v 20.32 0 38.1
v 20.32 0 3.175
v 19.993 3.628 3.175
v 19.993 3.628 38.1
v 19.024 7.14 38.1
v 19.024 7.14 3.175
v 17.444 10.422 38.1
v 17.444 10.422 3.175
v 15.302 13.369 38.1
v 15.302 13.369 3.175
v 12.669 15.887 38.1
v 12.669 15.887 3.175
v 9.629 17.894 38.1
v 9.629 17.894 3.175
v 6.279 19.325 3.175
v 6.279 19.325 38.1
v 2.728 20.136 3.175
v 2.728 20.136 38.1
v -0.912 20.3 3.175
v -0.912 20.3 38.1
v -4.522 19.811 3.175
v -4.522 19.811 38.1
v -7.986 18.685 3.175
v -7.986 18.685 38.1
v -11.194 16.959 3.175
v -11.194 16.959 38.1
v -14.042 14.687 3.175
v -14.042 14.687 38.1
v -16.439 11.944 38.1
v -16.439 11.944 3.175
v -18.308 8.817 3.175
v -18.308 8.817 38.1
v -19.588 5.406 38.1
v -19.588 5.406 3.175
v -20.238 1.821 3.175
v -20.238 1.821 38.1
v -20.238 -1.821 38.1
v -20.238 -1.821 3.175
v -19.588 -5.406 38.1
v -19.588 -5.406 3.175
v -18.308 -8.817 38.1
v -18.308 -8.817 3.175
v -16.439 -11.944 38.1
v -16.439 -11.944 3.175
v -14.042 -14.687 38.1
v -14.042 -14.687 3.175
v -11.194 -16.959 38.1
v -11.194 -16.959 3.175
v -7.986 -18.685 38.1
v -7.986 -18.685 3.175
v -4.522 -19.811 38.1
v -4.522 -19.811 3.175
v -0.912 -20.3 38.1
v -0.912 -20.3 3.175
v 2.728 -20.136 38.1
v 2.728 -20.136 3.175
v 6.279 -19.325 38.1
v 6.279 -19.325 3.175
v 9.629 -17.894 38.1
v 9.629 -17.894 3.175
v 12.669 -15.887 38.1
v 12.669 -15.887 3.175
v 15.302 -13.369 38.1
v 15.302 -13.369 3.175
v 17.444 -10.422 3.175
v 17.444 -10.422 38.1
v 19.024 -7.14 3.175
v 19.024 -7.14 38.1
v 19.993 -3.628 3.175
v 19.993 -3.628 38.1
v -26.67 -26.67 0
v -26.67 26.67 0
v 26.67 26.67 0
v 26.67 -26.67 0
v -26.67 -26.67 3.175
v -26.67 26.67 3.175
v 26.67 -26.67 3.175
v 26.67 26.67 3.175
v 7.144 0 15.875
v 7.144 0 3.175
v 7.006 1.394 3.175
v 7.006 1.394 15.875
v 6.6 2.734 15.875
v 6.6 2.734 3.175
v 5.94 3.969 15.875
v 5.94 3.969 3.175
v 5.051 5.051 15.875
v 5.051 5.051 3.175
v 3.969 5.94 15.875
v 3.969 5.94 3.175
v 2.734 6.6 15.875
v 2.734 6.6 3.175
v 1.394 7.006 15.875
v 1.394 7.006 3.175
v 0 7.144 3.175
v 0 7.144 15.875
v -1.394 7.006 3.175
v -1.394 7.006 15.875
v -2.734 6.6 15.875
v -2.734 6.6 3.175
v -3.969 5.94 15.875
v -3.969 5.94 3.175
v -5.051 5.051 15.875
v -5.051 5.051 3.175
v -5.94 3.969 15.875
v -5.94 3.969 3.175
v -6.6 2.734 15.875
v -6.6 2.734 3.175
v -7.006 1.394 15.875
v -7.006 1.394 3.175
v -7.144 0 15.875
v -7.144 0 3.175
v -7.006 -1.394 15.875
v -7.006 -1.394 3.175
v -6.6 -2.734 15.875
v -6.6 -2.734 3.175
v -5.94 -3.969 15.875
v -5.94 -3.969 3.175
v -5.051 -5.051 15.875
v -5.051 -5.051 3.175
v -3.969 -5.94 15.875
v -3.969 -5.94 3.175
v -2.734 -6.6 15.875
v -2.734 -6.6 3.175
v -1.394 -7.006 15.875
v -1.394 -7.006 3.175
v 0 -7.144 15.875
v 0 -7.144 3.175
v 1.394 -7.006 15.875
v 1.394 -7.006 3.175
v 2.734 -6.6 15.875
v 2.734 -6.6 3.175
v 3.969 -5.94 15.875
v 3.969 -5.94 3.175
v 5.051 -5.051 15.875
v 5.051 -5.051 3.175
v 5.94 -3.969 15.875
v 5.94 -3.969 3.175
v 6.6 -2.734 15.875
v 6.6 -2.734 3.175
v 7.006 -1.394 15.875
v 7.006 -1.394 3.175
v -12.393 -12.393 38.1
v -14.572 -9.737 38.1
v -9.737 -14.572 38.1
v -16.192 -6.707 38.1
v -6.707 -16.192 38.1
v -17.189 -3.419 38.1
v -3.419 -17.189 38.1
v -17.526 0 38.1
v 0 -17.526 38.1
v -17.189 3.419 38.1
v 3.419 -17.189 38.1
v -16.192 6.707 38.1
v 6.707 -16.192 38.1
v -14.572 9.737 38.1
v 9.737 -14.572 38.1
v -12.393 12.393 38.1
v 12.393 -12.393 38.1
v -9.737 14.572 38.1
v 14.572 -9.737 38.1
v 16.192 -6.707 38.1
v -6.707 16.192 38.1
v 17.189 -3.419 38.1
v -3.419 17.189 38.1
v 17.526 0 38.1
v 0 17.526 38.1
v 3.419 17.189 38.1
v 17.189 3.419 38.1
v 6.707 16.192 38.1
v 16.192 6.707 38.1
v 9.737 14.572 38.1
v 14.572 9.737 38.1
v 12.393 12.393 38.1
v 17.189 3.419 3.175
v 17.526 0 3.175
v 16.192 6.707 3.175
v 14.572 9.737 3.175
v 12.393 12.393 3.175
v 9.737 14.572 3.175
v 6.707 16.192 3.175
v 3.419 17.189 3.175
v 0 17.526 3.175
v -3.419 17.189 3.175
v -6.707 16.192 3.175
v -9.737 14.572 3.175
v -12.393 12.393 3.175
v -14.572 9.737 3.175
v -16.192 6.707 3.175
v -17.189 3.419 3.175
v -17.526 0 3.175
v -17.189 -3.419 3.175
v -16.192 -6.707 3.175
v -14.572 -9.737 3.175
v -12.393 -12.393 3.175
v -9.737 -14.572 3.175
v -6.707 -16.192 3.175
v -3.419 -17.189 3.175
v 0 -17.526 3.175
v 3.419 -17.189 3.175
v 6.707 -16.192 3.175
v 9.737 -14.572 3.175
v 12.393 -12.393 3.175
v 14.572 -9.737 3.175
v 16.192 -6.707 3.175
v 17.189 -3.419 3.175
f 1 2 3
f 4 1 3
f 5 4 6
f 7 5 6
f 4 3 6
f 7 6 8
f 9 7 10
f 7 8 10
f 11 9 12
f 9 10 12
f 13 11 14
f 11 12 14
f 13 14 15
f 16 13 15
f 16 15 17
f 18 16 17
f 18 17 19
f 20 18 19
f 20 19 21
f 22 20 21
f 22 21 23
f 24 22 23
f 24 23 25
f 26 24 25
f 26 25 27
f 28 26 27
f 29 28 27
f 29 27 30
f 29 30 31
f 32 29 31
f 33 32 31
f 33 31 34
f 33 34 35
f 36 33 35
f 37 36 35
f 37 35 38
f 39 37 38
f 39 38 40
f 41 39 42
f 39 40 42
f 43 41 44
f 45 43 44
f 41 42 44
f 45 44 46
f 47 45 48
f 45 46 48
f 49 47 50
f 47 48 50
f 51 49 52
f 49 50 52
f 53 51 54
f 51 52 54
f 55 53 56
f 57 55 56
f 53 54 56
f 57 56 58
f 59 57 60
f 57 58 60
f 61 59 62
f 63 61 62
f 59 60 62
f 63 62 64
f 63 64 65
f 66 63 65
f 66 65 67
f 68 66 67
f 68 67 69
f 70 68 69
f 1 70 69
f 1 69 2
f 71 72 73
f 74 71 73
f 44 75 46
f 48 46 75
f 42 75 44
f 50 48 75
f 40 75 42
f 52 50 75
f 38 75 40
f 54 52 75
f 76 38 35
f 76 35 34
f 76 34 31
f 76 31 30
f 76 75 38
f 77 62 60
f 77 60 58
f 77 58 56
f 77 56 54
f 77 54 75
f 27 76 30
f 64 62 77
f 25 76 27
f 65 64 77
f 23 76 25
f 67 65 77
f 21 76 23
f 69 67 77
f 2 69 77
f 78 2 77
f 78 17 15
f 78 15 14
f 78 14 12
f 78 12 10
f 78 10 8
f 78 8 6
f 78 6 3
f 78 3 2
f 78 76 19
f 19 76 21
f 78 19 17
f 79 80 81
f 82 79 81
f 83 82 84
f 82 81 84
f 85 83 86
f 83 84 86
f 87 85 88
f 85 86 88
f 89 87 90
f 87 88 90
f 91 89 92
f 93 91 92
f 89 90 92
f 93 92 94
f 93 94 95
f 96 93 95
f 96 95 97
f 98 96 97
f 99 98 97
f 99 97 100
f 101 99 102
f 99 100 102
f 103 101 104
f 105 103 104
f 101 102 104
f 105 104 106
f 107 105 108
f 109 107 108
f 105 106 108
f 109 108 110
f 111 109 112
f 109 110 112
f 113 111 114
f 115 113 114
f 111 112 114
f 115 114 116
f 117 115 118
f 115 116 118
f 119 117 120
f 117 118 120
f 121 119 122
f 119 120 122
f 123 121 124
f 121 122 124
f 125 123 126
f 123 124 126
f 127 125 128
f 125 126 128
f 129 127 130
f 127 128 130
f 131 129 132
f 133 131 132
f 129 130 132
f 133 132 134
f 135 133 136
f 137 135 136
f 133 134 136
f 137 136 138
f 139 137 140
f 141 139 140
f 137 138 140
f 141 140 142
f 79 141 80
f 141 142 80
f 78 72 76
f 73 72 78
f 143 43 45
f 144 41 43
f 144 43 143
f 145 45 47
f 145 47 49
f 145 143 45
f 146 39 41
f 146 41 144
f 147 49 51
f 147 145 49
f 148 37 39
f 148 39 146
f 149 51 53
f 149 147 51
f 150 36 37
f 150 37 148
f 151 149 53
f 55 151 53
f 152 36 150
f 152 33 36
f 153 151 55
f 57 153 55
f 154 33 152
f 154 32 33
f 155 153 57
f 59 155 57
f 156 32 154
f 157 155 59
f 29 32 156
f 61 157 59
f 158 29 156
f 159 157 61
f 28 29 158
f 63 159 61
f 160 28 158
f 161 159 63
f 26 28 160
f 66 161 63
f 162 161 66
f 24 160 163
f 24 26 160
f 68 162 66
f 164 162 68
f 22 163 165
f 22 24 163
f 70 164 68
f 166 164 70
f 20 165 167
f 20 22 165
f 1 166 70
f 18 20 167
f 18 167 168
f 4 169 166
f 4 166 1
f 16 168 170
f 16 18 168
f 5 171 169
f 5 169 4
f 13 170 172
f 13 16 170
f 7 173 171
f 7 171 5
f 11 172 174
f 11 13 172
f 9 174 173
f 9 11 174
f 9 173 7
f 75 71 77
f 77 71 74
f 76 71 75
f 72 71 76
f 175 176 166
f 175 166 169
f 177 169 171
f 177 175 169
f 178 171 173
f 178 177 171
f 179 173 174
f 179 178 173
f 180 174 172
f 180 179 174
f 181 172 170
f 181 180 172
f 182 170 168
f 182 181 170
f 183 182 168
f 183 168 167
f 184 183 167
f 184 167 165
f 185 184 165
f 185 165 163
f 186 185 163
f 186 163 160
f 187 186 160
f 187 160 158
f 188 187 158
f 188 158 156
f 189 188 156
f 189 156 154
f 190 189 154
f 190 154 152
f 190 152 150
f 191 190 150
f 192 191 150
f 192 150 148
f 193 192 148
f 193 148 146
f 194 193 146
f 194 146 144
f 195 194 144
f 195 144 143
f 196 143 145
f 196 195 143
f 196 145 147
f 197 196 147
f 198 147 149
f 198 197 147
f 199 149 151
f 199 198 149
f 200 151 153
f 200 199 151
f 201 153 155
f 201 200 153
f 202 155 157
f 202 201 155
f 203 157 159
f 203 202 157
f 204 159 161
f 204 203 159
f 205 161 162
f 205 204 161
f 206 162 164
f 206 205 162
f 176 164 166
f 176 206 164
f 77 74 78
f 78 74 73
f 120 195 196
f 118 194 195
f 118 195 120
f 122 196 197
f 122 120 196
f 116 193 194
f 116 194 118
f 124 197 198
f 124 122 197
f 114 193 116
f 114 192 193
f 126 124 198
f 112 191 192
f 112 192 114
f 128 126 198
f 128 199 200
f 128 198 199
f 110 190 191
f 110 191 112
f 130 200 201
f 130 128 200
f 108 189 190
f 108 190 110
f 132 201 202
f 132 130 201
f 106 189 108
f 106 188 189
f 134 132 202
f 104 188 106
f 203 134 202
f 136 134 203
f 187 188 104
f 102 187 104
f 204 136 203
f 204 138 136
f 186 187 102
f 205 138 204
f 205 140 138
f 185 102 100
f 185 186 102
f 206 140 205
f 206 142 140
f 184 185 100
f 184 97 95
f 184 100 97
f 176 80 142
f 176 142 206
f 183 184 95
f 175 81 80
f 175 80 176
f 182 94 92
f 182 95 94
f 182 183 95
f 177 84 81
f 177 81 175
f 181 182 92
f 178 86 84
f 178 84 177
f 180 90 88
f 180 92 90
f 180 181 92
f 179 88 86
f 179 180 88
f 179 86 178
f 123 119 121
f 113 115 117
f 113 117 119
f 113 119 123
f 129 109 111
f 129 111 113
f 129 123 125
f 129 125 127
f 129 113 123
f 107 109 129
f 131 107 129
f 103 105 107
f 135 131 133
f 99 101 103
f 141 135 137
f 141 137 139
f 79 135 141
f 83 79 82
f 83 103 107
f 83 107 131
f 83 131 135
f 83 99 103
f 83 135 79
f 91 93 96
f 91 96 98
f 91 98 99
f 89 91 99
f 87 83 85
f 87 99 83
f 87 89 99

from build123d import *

# Parameters (mm, degrees)
F0_R     = 20.32
F0_R_2   = 17.526
F1_DEPTH = 38.1
F2_W     = 53.34
F2_H     = 53.34
F3_DEPTH = 3.175
F4_R     = 7.14375
F5_DEPTH = 12.7


with BuildPart() as f1:
    # F0 (on Top) → F1 (new body)
    with BuildSketch(Plane.XY):
        Circle(F0_R)
        Circle(F0_R_2, mode=Mode.SUBTRACT)
    extrude(amount=F1_DEPTH)

    # F2 (on Top) → F3 (join)
    with BuildSketch(Plane.XY):
        Rectangle(F2_W, F2_H)
    extrude(amount=F3_DEPTH)

    # F4 (on face) → F5 (join)
    with BuildSketch(Plane.XY.offset(3.175)):
        Circle(F4_R)
    extrude(amount=F5_DEPTH)


solid = f1.part
